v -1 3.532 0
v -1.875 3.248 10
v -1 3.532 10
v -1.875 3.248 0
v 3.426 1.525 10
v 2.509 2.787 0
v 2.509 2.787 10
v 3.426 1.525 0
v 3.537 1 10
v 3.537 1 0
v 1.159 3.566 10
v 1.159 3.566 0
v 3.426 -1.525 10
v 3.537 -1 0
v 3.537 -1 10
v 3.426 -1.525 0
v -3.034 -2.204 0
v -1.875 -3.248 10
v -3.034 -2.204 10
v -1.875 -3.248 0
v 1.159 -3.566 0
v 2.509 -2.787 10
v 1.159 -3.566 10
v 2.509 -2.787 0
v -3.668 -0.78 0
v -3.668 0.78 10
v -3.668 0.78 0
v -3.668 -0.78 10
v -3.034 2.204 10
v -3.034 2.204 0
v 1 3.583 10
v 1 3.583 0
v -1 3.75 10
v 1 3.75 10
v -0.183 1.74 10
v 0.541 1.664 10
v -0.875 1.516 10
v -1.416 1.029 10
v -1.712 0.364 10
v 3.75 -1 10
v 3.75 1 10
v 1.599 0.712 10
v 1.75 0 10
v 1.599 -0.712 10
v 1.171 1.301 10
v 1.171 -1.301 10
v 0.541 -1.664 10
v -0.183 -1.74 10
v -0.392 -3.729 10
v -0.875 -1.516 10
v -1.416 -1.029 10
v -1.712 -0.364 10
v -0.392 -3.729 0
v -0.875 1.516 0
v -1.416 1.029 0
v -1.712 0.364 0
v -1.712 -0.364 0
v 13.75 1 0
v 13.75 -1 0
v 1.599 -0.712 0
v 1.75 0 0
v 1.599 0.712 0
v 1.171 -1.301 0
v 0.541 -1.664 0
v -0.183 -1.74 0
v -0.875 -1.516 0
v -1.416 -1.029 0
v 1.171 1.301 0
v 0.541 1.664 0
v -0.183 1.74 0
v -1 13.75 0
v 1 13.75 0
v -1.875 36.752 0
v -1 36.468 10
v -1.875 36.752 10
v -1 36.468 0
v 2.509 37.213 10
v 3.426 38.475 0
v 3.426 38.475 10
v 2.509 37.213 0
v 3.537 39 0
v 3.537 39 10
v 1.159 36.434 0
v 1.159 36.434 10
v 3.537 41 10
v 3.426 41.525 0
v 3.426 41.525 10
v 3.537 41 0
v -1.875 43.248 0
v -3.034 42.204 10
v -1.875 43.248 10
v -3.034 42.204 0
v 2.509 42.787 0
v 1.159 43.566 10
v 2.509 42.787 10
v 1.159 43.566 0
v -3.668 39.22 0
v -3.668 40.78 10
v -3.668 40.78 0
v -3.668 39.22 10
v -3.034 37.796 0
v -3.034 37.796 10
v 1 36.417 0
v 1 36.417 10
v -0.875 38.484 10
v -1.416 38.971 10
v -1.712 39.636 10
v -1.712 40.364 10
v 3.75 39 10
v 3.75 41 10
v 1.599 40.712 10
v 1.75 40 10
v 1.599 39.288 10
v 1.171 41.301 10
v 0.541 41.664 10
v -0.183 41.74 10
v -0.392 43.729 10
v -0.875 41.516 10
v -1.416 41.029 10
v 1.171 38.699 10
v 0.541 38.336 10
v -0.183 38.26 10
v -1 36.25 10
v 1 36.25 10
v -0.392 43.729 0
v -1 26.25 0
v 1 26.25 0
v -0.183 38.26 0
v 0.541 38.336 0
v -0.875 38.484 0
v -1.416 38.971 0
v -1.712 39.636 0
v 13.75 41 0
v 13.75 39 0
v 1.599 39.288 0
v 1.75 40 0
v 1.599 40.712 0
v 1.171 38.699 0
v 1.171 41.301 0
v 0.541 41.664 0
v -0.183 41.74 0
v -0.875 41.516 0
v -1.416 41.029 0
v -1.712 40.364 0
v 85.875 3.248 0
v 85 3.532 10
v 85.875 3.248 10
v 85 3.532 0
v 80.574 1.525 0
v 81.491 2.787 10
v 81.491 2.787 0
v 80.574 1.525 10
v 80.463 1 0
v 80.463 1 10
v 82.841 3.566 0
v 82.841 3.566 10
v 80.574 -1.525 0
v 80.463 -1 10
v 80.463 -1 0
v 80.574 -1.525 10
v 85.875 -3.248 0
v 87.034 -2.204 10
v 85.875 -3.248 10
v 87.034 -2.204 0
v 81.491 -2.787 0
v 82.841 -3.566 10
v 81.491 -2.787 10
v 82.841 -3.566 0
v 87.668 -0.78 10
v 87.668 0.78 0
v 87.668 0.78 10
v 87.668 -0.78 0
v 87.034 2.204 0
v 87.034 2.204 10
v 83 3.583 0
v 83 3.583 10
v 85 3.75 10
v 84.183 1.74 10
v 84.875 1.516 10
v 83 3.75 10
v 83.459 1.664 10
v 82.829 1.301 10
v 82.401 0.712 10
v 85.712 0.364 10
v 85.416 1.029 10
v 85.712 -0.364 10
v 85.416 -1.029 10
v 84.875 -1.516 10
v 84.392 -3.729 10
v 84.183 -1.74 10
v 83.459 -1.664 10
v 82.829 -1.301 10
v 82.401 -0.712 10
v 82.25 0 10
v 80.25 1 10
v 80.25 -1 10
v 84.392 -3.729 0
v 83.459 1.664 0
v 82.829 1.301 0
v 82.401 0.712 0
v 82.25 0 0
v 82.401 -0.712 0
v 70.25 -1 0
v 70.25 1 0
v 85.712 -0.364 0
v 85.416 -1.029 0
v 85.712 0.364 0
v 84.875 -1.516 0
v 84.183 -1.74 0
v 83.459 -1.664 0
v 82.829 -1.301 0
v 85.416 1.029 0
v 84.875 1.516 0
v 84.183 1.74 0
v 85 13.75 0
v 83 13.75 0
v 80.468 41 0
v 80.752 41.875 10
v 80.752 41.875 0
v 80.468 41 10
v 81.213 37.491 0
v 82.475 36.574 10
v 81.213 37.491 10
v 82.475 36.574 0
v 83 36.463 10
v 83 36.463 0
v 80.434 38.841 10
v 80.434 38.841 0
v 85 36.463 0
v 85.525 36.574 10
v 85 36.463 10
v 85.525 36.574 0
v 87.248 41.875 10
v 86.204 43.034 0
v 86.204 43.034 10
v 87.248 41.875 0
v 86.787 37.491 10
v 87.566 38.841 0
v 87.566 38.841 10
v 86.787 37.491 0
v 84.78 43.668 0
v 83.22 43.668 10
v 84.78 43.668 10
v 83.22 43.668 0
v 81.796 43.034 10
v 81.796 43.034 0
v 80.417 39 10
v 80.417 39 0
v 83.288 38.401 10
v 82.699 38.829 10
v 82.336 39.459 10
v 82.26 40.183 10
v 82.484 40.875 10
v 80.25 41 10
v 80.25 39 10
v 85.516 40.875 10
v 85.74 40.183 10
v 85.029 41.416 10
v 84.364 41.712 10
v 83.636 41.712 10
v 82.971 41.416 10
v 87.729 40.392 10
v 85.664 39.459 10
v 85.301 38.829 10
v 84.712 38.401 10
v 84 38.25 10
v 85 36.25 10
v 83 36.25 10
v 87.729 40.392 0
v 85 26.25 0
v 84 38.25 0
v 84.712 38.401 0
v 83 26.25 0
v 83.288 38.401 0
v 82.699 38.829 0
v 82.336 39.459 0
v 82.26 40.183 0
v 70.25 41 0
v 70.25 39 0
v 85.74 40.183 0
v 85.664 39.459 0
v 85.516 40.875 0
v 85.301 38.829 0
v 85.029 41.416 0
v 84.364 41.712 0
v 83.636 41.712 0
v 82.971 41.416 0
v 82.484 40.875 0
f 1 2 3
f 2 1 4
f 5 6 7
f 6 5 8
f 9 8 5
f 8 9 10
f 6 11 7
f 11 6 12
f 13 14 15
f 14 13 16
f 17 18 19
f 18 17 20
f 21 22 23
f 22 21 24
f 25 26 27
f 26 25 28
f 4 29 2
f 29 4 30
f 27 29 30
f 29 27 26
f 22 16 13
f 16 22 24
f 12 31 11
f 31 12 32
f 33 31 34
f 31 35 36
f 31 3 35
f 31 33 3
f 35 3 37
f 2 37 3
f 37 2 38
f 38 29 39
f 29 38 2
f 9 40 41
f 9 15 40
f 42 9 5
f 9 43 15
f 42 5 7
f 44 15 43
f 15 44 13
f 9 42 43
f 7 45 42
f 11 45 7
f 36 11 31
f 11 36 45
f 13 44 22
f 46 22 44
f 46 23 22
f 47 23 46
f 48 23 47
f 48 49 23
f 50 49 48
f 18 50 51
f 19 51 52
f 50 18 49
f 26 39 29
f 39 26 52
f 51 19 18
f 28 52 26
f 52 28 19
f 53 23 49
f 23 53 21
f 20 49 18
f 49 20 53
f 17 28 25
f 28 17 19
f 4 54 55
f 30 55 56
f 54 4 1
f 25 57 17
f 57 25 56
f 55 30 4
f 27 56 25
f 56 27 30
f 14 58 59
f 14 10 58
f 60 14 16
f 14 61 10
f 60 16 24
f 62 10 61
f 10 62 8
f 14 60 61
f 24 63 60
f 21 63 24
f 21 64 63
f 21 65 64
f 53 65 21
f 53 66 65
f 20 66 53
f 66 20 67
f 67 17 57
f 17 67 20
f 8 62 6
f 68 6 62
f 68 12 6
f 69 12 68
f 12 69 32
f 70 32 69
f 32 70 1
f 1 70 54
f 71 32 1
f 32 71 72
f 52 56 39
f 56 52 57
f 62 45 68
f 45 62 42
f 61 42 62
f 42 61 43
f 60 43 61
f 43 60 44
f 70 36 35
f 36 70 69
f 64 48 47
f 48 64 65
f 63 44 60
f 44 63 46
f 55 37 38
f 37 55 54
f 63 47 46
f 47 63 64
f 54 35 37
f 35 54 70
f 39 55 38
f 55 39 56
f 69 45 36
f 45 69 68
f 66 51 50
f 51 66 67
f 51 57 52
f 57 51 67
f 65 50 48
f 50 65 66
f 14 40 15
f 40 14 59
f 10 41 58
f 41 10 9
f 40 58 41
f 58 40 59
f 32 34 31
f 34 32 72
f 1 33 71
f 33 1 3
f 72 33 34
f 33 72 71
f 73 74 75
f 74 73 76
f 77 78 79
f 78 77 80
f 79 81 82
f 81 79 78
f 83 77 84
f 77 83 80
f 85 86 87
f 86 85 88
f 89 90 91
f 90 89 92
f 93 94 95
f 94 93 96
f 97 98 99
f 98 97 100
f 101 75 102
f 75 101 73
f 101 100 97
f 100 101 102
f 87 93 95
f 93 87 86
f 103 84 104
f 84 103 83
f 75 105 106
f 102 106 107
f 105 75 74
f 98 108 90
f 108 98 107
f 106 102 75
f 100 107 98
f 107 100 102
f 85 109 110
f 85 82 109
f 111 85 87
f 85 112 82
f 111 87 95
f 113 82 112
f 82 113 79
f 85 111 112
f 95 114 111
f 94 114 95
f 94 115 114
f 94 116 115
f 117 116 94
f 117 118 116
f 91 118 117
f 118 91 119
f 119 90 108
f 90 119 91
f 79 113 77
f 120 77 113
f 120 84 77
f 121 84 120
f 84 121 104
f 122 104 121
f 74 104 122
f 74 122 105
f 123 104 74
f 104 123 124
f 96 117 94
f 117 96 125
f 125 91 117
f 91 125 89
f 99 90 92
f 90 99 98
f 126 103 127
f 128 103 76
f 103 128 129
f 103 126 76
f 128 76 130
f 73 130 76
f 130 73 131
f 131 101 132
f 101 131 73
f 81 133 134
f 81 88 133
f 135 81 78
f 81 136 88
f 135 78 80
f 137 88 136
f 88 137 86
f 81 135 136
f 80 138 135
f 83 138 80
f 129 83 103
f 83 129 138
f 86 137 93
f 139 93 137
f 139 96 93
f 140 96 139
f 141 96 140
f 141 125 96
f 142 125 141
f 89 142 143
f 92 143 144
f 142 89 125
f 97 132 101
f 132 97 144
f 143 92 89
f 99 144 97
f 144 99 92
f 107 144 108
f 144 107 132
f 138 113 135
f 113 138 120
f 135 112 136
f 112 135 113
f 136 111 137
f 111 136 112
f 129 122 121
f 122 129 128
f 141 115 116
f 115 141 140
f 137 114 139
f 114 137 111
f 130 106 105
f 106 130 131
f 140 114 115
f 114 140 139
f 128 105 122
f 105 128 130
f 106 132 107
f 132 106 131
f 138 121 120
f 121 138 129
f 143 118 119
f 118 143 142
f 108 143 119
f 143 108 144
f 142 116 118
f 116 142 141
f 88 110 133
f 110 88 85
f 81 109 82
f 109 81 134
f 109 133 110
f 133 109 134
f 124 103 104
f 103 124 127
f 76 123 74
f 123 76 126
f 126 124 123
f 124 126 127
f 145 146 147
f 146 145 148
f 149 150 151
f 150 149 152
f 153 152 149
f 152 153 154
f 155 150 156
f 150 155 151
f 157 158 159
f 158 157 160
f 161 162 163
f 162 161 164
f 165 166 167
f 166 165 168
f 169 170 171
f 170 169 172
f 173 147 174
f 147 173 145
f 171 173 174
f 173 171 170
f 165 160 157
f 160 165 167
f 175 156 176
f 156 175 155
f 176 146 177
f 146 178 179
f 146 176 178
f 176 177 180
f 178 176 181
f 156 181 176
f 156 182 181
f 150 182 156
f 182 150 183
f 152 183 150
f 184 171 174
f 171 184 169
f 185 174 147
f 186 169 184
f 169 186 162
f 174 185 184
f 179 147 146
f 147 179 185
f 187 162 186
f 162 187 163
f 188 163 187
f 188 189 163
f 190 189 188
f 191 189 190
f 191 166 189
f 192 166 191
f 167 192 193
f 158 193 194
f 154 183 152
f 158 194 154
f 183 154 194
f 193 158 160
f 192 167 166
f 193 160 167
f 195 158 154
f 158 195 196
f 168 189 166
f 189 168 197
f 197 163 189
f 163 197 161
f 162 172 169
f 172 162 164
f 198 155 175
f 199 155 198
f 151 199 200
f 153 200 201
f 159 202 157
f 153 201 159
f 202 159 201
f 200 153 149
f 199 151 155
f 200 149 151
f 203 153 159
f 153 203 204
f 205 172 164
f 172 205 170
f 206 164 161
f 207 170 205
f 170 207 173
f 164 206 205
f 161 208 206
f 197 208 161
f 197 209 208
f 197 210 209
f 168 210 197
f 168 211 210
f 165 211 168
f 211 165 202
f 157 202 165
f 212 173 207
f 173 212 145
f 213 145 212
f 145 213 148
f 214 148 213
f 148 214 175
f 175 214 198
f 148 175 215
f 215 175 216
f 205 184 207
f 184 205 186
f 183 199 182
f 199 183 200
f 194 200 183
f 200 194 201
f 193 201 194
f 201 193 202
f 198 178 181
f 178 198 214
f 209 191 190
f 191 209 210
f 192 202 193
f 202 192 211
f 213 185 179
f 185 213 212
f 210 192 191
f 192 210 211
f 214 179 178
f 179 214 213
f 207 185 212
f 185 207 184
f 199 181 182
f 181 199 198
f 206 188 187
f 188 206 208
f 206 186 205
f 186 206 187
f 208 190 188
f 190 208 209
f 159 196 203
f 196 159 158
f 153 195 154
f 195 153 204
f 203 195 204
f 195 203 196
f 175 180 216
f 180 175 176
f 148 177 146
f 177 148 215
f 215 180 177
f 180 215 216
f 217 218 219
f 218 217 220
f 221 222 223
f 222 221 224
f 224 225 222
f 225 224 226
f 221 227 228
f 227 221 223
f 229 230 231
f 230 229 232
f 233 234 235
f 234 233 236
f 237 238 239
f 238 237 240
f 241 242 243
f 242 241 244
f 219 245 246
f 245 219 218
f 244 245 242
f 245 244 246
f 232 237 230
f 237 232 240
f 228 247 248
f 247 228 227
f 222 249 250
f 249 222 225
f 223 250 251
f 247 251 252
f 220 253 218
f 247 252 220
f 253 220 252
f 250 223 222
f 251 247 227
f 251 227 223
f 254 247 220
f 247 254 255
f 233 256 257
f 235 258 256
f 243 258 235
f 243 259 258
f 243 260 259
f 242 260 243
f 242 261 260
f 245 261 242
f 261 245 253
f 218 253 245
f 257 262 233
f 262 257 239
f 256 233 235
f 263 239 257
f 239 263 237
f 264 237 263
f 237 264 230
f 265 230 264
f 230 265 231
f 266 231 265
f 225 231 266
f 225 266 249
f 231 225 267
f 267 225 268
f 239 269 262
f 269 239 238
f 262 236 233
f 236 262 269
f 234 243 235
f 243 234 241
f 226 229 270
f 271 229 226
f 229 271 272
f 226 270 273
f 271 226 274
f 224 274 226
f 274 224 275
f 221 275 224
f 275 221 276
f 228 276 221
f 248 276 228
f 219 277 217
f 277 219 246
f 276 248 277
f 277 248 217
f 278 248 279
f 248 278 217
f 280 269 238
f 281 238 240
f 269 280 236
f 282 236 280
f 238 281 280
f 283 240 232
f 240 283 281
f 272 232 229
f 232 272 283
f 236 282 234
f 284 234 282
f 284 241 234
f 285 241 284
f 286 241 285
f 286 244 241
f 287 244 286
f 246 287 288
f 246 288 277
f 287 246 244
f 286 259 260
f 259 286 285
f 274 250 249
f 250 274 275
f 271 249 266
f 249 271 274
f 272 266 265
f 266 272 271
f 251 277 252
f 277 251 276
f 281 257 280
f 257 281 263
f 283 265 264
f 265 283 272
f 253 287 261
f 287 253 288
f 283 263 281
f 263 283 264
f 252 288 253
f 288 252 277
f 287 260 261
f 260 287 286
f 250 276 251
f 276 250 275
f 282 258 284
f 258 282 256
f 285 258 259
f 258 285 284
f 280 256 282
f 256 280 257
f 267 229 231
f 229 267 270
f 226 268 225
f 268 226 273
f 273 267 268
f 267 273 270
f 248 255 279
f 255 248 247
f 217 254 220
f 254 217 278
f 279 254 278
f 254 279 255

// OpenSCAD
// file: ../components/triangular_right_prism.scad
module triangular_right_prism(l, w, h){
    polyhedron(//pt 0        1        2        3        4        5
        points=[[0,0,0], [l,0,0], [l,w,0], [0,w,0], [0,0,h], [l,0,h]],
        faces=[[0,1,2,3],[5,4,3,2],[0,4,5,1],[0,3,4],[5,2,1]]
    );
}
// main file
use <../components/triangular_right_prism.scad>

/*
    module insert_mount
    -
    This module is thought to be used for threaded insert mounts,
    if used only for fasteners consider the difference of diameter
    between the threads and the shaft.
    -
    parameters:
    -h                  total height of the mount
    -insert_r           radius of the screw or insert
    -thickness        thickness of the supports and walls around the insert
    -support_h          height of the support as percent of h
    -support_amount     number of supports
    -support_every_deg  degrees between supports
    -
    notice that ideally the support_amount x support_every_deg should
    not equal more than 360
*/

module insert_mount(
    h = 10,
    insert_r = 1.75,
    thickness = 2,
    support_h = 100,
    support_amount = 4,
    support_every_deg = 90
) {
    $fn=15; // set facette number
    support_h = h * support_h / 100;

    // The body of the mount
    difference() {
        cylinder(h = h, r = insert_r + thickness);
        cylinder(h = h, r = insert_r);
    }

    // Supports
    if (support_amount) {
        rotate(-90) // First support to point to the positive x side
        for(i=[0:support_amount - 1]) {
            rotate(i * support_every_deg) {
                translate([-thickness/2,0,0]){
                    translate([0 , insert_r, 0])
                    cube([thickness, thickness, support_h]);

                    translate([0, insert_r + thickness, 0])
                    triangular_right_prism(thickness, support_h, support_h);
                }
            }
        }
    }
}

/*
    block of four insert mounts

    params:
    -x              distance between corner screw-hole centers in the x axis
    -y              distance between corner screw-hole centers in the y axis
    -h              height of the mounts
    -insert_r       radius of the inserns or screw to be used
    -thickness_w    thickness of the walls around the inserts
    -supports       number of supports, more than 4 has no effect

*/

module insert_mount_block(
    size,
    insert_r = 1.75,
    thickness = 2,
    supports = 2
) {
    for (i = [0:1]) {
        for (j = [0:1]) {
            translate([i * size.x, j * size.y, 0])
            mirror([i, j, 0]) // Make all point to the center
            insert_mount(
                h = size.z,
                insert_r = insert_r,
                thickness = thickness,
                support_h = 100,
                support_amount = supports
            );
        }
    }
}

// showcase
insert_mount_block(size = [84, 40, 10], supports = 2);
